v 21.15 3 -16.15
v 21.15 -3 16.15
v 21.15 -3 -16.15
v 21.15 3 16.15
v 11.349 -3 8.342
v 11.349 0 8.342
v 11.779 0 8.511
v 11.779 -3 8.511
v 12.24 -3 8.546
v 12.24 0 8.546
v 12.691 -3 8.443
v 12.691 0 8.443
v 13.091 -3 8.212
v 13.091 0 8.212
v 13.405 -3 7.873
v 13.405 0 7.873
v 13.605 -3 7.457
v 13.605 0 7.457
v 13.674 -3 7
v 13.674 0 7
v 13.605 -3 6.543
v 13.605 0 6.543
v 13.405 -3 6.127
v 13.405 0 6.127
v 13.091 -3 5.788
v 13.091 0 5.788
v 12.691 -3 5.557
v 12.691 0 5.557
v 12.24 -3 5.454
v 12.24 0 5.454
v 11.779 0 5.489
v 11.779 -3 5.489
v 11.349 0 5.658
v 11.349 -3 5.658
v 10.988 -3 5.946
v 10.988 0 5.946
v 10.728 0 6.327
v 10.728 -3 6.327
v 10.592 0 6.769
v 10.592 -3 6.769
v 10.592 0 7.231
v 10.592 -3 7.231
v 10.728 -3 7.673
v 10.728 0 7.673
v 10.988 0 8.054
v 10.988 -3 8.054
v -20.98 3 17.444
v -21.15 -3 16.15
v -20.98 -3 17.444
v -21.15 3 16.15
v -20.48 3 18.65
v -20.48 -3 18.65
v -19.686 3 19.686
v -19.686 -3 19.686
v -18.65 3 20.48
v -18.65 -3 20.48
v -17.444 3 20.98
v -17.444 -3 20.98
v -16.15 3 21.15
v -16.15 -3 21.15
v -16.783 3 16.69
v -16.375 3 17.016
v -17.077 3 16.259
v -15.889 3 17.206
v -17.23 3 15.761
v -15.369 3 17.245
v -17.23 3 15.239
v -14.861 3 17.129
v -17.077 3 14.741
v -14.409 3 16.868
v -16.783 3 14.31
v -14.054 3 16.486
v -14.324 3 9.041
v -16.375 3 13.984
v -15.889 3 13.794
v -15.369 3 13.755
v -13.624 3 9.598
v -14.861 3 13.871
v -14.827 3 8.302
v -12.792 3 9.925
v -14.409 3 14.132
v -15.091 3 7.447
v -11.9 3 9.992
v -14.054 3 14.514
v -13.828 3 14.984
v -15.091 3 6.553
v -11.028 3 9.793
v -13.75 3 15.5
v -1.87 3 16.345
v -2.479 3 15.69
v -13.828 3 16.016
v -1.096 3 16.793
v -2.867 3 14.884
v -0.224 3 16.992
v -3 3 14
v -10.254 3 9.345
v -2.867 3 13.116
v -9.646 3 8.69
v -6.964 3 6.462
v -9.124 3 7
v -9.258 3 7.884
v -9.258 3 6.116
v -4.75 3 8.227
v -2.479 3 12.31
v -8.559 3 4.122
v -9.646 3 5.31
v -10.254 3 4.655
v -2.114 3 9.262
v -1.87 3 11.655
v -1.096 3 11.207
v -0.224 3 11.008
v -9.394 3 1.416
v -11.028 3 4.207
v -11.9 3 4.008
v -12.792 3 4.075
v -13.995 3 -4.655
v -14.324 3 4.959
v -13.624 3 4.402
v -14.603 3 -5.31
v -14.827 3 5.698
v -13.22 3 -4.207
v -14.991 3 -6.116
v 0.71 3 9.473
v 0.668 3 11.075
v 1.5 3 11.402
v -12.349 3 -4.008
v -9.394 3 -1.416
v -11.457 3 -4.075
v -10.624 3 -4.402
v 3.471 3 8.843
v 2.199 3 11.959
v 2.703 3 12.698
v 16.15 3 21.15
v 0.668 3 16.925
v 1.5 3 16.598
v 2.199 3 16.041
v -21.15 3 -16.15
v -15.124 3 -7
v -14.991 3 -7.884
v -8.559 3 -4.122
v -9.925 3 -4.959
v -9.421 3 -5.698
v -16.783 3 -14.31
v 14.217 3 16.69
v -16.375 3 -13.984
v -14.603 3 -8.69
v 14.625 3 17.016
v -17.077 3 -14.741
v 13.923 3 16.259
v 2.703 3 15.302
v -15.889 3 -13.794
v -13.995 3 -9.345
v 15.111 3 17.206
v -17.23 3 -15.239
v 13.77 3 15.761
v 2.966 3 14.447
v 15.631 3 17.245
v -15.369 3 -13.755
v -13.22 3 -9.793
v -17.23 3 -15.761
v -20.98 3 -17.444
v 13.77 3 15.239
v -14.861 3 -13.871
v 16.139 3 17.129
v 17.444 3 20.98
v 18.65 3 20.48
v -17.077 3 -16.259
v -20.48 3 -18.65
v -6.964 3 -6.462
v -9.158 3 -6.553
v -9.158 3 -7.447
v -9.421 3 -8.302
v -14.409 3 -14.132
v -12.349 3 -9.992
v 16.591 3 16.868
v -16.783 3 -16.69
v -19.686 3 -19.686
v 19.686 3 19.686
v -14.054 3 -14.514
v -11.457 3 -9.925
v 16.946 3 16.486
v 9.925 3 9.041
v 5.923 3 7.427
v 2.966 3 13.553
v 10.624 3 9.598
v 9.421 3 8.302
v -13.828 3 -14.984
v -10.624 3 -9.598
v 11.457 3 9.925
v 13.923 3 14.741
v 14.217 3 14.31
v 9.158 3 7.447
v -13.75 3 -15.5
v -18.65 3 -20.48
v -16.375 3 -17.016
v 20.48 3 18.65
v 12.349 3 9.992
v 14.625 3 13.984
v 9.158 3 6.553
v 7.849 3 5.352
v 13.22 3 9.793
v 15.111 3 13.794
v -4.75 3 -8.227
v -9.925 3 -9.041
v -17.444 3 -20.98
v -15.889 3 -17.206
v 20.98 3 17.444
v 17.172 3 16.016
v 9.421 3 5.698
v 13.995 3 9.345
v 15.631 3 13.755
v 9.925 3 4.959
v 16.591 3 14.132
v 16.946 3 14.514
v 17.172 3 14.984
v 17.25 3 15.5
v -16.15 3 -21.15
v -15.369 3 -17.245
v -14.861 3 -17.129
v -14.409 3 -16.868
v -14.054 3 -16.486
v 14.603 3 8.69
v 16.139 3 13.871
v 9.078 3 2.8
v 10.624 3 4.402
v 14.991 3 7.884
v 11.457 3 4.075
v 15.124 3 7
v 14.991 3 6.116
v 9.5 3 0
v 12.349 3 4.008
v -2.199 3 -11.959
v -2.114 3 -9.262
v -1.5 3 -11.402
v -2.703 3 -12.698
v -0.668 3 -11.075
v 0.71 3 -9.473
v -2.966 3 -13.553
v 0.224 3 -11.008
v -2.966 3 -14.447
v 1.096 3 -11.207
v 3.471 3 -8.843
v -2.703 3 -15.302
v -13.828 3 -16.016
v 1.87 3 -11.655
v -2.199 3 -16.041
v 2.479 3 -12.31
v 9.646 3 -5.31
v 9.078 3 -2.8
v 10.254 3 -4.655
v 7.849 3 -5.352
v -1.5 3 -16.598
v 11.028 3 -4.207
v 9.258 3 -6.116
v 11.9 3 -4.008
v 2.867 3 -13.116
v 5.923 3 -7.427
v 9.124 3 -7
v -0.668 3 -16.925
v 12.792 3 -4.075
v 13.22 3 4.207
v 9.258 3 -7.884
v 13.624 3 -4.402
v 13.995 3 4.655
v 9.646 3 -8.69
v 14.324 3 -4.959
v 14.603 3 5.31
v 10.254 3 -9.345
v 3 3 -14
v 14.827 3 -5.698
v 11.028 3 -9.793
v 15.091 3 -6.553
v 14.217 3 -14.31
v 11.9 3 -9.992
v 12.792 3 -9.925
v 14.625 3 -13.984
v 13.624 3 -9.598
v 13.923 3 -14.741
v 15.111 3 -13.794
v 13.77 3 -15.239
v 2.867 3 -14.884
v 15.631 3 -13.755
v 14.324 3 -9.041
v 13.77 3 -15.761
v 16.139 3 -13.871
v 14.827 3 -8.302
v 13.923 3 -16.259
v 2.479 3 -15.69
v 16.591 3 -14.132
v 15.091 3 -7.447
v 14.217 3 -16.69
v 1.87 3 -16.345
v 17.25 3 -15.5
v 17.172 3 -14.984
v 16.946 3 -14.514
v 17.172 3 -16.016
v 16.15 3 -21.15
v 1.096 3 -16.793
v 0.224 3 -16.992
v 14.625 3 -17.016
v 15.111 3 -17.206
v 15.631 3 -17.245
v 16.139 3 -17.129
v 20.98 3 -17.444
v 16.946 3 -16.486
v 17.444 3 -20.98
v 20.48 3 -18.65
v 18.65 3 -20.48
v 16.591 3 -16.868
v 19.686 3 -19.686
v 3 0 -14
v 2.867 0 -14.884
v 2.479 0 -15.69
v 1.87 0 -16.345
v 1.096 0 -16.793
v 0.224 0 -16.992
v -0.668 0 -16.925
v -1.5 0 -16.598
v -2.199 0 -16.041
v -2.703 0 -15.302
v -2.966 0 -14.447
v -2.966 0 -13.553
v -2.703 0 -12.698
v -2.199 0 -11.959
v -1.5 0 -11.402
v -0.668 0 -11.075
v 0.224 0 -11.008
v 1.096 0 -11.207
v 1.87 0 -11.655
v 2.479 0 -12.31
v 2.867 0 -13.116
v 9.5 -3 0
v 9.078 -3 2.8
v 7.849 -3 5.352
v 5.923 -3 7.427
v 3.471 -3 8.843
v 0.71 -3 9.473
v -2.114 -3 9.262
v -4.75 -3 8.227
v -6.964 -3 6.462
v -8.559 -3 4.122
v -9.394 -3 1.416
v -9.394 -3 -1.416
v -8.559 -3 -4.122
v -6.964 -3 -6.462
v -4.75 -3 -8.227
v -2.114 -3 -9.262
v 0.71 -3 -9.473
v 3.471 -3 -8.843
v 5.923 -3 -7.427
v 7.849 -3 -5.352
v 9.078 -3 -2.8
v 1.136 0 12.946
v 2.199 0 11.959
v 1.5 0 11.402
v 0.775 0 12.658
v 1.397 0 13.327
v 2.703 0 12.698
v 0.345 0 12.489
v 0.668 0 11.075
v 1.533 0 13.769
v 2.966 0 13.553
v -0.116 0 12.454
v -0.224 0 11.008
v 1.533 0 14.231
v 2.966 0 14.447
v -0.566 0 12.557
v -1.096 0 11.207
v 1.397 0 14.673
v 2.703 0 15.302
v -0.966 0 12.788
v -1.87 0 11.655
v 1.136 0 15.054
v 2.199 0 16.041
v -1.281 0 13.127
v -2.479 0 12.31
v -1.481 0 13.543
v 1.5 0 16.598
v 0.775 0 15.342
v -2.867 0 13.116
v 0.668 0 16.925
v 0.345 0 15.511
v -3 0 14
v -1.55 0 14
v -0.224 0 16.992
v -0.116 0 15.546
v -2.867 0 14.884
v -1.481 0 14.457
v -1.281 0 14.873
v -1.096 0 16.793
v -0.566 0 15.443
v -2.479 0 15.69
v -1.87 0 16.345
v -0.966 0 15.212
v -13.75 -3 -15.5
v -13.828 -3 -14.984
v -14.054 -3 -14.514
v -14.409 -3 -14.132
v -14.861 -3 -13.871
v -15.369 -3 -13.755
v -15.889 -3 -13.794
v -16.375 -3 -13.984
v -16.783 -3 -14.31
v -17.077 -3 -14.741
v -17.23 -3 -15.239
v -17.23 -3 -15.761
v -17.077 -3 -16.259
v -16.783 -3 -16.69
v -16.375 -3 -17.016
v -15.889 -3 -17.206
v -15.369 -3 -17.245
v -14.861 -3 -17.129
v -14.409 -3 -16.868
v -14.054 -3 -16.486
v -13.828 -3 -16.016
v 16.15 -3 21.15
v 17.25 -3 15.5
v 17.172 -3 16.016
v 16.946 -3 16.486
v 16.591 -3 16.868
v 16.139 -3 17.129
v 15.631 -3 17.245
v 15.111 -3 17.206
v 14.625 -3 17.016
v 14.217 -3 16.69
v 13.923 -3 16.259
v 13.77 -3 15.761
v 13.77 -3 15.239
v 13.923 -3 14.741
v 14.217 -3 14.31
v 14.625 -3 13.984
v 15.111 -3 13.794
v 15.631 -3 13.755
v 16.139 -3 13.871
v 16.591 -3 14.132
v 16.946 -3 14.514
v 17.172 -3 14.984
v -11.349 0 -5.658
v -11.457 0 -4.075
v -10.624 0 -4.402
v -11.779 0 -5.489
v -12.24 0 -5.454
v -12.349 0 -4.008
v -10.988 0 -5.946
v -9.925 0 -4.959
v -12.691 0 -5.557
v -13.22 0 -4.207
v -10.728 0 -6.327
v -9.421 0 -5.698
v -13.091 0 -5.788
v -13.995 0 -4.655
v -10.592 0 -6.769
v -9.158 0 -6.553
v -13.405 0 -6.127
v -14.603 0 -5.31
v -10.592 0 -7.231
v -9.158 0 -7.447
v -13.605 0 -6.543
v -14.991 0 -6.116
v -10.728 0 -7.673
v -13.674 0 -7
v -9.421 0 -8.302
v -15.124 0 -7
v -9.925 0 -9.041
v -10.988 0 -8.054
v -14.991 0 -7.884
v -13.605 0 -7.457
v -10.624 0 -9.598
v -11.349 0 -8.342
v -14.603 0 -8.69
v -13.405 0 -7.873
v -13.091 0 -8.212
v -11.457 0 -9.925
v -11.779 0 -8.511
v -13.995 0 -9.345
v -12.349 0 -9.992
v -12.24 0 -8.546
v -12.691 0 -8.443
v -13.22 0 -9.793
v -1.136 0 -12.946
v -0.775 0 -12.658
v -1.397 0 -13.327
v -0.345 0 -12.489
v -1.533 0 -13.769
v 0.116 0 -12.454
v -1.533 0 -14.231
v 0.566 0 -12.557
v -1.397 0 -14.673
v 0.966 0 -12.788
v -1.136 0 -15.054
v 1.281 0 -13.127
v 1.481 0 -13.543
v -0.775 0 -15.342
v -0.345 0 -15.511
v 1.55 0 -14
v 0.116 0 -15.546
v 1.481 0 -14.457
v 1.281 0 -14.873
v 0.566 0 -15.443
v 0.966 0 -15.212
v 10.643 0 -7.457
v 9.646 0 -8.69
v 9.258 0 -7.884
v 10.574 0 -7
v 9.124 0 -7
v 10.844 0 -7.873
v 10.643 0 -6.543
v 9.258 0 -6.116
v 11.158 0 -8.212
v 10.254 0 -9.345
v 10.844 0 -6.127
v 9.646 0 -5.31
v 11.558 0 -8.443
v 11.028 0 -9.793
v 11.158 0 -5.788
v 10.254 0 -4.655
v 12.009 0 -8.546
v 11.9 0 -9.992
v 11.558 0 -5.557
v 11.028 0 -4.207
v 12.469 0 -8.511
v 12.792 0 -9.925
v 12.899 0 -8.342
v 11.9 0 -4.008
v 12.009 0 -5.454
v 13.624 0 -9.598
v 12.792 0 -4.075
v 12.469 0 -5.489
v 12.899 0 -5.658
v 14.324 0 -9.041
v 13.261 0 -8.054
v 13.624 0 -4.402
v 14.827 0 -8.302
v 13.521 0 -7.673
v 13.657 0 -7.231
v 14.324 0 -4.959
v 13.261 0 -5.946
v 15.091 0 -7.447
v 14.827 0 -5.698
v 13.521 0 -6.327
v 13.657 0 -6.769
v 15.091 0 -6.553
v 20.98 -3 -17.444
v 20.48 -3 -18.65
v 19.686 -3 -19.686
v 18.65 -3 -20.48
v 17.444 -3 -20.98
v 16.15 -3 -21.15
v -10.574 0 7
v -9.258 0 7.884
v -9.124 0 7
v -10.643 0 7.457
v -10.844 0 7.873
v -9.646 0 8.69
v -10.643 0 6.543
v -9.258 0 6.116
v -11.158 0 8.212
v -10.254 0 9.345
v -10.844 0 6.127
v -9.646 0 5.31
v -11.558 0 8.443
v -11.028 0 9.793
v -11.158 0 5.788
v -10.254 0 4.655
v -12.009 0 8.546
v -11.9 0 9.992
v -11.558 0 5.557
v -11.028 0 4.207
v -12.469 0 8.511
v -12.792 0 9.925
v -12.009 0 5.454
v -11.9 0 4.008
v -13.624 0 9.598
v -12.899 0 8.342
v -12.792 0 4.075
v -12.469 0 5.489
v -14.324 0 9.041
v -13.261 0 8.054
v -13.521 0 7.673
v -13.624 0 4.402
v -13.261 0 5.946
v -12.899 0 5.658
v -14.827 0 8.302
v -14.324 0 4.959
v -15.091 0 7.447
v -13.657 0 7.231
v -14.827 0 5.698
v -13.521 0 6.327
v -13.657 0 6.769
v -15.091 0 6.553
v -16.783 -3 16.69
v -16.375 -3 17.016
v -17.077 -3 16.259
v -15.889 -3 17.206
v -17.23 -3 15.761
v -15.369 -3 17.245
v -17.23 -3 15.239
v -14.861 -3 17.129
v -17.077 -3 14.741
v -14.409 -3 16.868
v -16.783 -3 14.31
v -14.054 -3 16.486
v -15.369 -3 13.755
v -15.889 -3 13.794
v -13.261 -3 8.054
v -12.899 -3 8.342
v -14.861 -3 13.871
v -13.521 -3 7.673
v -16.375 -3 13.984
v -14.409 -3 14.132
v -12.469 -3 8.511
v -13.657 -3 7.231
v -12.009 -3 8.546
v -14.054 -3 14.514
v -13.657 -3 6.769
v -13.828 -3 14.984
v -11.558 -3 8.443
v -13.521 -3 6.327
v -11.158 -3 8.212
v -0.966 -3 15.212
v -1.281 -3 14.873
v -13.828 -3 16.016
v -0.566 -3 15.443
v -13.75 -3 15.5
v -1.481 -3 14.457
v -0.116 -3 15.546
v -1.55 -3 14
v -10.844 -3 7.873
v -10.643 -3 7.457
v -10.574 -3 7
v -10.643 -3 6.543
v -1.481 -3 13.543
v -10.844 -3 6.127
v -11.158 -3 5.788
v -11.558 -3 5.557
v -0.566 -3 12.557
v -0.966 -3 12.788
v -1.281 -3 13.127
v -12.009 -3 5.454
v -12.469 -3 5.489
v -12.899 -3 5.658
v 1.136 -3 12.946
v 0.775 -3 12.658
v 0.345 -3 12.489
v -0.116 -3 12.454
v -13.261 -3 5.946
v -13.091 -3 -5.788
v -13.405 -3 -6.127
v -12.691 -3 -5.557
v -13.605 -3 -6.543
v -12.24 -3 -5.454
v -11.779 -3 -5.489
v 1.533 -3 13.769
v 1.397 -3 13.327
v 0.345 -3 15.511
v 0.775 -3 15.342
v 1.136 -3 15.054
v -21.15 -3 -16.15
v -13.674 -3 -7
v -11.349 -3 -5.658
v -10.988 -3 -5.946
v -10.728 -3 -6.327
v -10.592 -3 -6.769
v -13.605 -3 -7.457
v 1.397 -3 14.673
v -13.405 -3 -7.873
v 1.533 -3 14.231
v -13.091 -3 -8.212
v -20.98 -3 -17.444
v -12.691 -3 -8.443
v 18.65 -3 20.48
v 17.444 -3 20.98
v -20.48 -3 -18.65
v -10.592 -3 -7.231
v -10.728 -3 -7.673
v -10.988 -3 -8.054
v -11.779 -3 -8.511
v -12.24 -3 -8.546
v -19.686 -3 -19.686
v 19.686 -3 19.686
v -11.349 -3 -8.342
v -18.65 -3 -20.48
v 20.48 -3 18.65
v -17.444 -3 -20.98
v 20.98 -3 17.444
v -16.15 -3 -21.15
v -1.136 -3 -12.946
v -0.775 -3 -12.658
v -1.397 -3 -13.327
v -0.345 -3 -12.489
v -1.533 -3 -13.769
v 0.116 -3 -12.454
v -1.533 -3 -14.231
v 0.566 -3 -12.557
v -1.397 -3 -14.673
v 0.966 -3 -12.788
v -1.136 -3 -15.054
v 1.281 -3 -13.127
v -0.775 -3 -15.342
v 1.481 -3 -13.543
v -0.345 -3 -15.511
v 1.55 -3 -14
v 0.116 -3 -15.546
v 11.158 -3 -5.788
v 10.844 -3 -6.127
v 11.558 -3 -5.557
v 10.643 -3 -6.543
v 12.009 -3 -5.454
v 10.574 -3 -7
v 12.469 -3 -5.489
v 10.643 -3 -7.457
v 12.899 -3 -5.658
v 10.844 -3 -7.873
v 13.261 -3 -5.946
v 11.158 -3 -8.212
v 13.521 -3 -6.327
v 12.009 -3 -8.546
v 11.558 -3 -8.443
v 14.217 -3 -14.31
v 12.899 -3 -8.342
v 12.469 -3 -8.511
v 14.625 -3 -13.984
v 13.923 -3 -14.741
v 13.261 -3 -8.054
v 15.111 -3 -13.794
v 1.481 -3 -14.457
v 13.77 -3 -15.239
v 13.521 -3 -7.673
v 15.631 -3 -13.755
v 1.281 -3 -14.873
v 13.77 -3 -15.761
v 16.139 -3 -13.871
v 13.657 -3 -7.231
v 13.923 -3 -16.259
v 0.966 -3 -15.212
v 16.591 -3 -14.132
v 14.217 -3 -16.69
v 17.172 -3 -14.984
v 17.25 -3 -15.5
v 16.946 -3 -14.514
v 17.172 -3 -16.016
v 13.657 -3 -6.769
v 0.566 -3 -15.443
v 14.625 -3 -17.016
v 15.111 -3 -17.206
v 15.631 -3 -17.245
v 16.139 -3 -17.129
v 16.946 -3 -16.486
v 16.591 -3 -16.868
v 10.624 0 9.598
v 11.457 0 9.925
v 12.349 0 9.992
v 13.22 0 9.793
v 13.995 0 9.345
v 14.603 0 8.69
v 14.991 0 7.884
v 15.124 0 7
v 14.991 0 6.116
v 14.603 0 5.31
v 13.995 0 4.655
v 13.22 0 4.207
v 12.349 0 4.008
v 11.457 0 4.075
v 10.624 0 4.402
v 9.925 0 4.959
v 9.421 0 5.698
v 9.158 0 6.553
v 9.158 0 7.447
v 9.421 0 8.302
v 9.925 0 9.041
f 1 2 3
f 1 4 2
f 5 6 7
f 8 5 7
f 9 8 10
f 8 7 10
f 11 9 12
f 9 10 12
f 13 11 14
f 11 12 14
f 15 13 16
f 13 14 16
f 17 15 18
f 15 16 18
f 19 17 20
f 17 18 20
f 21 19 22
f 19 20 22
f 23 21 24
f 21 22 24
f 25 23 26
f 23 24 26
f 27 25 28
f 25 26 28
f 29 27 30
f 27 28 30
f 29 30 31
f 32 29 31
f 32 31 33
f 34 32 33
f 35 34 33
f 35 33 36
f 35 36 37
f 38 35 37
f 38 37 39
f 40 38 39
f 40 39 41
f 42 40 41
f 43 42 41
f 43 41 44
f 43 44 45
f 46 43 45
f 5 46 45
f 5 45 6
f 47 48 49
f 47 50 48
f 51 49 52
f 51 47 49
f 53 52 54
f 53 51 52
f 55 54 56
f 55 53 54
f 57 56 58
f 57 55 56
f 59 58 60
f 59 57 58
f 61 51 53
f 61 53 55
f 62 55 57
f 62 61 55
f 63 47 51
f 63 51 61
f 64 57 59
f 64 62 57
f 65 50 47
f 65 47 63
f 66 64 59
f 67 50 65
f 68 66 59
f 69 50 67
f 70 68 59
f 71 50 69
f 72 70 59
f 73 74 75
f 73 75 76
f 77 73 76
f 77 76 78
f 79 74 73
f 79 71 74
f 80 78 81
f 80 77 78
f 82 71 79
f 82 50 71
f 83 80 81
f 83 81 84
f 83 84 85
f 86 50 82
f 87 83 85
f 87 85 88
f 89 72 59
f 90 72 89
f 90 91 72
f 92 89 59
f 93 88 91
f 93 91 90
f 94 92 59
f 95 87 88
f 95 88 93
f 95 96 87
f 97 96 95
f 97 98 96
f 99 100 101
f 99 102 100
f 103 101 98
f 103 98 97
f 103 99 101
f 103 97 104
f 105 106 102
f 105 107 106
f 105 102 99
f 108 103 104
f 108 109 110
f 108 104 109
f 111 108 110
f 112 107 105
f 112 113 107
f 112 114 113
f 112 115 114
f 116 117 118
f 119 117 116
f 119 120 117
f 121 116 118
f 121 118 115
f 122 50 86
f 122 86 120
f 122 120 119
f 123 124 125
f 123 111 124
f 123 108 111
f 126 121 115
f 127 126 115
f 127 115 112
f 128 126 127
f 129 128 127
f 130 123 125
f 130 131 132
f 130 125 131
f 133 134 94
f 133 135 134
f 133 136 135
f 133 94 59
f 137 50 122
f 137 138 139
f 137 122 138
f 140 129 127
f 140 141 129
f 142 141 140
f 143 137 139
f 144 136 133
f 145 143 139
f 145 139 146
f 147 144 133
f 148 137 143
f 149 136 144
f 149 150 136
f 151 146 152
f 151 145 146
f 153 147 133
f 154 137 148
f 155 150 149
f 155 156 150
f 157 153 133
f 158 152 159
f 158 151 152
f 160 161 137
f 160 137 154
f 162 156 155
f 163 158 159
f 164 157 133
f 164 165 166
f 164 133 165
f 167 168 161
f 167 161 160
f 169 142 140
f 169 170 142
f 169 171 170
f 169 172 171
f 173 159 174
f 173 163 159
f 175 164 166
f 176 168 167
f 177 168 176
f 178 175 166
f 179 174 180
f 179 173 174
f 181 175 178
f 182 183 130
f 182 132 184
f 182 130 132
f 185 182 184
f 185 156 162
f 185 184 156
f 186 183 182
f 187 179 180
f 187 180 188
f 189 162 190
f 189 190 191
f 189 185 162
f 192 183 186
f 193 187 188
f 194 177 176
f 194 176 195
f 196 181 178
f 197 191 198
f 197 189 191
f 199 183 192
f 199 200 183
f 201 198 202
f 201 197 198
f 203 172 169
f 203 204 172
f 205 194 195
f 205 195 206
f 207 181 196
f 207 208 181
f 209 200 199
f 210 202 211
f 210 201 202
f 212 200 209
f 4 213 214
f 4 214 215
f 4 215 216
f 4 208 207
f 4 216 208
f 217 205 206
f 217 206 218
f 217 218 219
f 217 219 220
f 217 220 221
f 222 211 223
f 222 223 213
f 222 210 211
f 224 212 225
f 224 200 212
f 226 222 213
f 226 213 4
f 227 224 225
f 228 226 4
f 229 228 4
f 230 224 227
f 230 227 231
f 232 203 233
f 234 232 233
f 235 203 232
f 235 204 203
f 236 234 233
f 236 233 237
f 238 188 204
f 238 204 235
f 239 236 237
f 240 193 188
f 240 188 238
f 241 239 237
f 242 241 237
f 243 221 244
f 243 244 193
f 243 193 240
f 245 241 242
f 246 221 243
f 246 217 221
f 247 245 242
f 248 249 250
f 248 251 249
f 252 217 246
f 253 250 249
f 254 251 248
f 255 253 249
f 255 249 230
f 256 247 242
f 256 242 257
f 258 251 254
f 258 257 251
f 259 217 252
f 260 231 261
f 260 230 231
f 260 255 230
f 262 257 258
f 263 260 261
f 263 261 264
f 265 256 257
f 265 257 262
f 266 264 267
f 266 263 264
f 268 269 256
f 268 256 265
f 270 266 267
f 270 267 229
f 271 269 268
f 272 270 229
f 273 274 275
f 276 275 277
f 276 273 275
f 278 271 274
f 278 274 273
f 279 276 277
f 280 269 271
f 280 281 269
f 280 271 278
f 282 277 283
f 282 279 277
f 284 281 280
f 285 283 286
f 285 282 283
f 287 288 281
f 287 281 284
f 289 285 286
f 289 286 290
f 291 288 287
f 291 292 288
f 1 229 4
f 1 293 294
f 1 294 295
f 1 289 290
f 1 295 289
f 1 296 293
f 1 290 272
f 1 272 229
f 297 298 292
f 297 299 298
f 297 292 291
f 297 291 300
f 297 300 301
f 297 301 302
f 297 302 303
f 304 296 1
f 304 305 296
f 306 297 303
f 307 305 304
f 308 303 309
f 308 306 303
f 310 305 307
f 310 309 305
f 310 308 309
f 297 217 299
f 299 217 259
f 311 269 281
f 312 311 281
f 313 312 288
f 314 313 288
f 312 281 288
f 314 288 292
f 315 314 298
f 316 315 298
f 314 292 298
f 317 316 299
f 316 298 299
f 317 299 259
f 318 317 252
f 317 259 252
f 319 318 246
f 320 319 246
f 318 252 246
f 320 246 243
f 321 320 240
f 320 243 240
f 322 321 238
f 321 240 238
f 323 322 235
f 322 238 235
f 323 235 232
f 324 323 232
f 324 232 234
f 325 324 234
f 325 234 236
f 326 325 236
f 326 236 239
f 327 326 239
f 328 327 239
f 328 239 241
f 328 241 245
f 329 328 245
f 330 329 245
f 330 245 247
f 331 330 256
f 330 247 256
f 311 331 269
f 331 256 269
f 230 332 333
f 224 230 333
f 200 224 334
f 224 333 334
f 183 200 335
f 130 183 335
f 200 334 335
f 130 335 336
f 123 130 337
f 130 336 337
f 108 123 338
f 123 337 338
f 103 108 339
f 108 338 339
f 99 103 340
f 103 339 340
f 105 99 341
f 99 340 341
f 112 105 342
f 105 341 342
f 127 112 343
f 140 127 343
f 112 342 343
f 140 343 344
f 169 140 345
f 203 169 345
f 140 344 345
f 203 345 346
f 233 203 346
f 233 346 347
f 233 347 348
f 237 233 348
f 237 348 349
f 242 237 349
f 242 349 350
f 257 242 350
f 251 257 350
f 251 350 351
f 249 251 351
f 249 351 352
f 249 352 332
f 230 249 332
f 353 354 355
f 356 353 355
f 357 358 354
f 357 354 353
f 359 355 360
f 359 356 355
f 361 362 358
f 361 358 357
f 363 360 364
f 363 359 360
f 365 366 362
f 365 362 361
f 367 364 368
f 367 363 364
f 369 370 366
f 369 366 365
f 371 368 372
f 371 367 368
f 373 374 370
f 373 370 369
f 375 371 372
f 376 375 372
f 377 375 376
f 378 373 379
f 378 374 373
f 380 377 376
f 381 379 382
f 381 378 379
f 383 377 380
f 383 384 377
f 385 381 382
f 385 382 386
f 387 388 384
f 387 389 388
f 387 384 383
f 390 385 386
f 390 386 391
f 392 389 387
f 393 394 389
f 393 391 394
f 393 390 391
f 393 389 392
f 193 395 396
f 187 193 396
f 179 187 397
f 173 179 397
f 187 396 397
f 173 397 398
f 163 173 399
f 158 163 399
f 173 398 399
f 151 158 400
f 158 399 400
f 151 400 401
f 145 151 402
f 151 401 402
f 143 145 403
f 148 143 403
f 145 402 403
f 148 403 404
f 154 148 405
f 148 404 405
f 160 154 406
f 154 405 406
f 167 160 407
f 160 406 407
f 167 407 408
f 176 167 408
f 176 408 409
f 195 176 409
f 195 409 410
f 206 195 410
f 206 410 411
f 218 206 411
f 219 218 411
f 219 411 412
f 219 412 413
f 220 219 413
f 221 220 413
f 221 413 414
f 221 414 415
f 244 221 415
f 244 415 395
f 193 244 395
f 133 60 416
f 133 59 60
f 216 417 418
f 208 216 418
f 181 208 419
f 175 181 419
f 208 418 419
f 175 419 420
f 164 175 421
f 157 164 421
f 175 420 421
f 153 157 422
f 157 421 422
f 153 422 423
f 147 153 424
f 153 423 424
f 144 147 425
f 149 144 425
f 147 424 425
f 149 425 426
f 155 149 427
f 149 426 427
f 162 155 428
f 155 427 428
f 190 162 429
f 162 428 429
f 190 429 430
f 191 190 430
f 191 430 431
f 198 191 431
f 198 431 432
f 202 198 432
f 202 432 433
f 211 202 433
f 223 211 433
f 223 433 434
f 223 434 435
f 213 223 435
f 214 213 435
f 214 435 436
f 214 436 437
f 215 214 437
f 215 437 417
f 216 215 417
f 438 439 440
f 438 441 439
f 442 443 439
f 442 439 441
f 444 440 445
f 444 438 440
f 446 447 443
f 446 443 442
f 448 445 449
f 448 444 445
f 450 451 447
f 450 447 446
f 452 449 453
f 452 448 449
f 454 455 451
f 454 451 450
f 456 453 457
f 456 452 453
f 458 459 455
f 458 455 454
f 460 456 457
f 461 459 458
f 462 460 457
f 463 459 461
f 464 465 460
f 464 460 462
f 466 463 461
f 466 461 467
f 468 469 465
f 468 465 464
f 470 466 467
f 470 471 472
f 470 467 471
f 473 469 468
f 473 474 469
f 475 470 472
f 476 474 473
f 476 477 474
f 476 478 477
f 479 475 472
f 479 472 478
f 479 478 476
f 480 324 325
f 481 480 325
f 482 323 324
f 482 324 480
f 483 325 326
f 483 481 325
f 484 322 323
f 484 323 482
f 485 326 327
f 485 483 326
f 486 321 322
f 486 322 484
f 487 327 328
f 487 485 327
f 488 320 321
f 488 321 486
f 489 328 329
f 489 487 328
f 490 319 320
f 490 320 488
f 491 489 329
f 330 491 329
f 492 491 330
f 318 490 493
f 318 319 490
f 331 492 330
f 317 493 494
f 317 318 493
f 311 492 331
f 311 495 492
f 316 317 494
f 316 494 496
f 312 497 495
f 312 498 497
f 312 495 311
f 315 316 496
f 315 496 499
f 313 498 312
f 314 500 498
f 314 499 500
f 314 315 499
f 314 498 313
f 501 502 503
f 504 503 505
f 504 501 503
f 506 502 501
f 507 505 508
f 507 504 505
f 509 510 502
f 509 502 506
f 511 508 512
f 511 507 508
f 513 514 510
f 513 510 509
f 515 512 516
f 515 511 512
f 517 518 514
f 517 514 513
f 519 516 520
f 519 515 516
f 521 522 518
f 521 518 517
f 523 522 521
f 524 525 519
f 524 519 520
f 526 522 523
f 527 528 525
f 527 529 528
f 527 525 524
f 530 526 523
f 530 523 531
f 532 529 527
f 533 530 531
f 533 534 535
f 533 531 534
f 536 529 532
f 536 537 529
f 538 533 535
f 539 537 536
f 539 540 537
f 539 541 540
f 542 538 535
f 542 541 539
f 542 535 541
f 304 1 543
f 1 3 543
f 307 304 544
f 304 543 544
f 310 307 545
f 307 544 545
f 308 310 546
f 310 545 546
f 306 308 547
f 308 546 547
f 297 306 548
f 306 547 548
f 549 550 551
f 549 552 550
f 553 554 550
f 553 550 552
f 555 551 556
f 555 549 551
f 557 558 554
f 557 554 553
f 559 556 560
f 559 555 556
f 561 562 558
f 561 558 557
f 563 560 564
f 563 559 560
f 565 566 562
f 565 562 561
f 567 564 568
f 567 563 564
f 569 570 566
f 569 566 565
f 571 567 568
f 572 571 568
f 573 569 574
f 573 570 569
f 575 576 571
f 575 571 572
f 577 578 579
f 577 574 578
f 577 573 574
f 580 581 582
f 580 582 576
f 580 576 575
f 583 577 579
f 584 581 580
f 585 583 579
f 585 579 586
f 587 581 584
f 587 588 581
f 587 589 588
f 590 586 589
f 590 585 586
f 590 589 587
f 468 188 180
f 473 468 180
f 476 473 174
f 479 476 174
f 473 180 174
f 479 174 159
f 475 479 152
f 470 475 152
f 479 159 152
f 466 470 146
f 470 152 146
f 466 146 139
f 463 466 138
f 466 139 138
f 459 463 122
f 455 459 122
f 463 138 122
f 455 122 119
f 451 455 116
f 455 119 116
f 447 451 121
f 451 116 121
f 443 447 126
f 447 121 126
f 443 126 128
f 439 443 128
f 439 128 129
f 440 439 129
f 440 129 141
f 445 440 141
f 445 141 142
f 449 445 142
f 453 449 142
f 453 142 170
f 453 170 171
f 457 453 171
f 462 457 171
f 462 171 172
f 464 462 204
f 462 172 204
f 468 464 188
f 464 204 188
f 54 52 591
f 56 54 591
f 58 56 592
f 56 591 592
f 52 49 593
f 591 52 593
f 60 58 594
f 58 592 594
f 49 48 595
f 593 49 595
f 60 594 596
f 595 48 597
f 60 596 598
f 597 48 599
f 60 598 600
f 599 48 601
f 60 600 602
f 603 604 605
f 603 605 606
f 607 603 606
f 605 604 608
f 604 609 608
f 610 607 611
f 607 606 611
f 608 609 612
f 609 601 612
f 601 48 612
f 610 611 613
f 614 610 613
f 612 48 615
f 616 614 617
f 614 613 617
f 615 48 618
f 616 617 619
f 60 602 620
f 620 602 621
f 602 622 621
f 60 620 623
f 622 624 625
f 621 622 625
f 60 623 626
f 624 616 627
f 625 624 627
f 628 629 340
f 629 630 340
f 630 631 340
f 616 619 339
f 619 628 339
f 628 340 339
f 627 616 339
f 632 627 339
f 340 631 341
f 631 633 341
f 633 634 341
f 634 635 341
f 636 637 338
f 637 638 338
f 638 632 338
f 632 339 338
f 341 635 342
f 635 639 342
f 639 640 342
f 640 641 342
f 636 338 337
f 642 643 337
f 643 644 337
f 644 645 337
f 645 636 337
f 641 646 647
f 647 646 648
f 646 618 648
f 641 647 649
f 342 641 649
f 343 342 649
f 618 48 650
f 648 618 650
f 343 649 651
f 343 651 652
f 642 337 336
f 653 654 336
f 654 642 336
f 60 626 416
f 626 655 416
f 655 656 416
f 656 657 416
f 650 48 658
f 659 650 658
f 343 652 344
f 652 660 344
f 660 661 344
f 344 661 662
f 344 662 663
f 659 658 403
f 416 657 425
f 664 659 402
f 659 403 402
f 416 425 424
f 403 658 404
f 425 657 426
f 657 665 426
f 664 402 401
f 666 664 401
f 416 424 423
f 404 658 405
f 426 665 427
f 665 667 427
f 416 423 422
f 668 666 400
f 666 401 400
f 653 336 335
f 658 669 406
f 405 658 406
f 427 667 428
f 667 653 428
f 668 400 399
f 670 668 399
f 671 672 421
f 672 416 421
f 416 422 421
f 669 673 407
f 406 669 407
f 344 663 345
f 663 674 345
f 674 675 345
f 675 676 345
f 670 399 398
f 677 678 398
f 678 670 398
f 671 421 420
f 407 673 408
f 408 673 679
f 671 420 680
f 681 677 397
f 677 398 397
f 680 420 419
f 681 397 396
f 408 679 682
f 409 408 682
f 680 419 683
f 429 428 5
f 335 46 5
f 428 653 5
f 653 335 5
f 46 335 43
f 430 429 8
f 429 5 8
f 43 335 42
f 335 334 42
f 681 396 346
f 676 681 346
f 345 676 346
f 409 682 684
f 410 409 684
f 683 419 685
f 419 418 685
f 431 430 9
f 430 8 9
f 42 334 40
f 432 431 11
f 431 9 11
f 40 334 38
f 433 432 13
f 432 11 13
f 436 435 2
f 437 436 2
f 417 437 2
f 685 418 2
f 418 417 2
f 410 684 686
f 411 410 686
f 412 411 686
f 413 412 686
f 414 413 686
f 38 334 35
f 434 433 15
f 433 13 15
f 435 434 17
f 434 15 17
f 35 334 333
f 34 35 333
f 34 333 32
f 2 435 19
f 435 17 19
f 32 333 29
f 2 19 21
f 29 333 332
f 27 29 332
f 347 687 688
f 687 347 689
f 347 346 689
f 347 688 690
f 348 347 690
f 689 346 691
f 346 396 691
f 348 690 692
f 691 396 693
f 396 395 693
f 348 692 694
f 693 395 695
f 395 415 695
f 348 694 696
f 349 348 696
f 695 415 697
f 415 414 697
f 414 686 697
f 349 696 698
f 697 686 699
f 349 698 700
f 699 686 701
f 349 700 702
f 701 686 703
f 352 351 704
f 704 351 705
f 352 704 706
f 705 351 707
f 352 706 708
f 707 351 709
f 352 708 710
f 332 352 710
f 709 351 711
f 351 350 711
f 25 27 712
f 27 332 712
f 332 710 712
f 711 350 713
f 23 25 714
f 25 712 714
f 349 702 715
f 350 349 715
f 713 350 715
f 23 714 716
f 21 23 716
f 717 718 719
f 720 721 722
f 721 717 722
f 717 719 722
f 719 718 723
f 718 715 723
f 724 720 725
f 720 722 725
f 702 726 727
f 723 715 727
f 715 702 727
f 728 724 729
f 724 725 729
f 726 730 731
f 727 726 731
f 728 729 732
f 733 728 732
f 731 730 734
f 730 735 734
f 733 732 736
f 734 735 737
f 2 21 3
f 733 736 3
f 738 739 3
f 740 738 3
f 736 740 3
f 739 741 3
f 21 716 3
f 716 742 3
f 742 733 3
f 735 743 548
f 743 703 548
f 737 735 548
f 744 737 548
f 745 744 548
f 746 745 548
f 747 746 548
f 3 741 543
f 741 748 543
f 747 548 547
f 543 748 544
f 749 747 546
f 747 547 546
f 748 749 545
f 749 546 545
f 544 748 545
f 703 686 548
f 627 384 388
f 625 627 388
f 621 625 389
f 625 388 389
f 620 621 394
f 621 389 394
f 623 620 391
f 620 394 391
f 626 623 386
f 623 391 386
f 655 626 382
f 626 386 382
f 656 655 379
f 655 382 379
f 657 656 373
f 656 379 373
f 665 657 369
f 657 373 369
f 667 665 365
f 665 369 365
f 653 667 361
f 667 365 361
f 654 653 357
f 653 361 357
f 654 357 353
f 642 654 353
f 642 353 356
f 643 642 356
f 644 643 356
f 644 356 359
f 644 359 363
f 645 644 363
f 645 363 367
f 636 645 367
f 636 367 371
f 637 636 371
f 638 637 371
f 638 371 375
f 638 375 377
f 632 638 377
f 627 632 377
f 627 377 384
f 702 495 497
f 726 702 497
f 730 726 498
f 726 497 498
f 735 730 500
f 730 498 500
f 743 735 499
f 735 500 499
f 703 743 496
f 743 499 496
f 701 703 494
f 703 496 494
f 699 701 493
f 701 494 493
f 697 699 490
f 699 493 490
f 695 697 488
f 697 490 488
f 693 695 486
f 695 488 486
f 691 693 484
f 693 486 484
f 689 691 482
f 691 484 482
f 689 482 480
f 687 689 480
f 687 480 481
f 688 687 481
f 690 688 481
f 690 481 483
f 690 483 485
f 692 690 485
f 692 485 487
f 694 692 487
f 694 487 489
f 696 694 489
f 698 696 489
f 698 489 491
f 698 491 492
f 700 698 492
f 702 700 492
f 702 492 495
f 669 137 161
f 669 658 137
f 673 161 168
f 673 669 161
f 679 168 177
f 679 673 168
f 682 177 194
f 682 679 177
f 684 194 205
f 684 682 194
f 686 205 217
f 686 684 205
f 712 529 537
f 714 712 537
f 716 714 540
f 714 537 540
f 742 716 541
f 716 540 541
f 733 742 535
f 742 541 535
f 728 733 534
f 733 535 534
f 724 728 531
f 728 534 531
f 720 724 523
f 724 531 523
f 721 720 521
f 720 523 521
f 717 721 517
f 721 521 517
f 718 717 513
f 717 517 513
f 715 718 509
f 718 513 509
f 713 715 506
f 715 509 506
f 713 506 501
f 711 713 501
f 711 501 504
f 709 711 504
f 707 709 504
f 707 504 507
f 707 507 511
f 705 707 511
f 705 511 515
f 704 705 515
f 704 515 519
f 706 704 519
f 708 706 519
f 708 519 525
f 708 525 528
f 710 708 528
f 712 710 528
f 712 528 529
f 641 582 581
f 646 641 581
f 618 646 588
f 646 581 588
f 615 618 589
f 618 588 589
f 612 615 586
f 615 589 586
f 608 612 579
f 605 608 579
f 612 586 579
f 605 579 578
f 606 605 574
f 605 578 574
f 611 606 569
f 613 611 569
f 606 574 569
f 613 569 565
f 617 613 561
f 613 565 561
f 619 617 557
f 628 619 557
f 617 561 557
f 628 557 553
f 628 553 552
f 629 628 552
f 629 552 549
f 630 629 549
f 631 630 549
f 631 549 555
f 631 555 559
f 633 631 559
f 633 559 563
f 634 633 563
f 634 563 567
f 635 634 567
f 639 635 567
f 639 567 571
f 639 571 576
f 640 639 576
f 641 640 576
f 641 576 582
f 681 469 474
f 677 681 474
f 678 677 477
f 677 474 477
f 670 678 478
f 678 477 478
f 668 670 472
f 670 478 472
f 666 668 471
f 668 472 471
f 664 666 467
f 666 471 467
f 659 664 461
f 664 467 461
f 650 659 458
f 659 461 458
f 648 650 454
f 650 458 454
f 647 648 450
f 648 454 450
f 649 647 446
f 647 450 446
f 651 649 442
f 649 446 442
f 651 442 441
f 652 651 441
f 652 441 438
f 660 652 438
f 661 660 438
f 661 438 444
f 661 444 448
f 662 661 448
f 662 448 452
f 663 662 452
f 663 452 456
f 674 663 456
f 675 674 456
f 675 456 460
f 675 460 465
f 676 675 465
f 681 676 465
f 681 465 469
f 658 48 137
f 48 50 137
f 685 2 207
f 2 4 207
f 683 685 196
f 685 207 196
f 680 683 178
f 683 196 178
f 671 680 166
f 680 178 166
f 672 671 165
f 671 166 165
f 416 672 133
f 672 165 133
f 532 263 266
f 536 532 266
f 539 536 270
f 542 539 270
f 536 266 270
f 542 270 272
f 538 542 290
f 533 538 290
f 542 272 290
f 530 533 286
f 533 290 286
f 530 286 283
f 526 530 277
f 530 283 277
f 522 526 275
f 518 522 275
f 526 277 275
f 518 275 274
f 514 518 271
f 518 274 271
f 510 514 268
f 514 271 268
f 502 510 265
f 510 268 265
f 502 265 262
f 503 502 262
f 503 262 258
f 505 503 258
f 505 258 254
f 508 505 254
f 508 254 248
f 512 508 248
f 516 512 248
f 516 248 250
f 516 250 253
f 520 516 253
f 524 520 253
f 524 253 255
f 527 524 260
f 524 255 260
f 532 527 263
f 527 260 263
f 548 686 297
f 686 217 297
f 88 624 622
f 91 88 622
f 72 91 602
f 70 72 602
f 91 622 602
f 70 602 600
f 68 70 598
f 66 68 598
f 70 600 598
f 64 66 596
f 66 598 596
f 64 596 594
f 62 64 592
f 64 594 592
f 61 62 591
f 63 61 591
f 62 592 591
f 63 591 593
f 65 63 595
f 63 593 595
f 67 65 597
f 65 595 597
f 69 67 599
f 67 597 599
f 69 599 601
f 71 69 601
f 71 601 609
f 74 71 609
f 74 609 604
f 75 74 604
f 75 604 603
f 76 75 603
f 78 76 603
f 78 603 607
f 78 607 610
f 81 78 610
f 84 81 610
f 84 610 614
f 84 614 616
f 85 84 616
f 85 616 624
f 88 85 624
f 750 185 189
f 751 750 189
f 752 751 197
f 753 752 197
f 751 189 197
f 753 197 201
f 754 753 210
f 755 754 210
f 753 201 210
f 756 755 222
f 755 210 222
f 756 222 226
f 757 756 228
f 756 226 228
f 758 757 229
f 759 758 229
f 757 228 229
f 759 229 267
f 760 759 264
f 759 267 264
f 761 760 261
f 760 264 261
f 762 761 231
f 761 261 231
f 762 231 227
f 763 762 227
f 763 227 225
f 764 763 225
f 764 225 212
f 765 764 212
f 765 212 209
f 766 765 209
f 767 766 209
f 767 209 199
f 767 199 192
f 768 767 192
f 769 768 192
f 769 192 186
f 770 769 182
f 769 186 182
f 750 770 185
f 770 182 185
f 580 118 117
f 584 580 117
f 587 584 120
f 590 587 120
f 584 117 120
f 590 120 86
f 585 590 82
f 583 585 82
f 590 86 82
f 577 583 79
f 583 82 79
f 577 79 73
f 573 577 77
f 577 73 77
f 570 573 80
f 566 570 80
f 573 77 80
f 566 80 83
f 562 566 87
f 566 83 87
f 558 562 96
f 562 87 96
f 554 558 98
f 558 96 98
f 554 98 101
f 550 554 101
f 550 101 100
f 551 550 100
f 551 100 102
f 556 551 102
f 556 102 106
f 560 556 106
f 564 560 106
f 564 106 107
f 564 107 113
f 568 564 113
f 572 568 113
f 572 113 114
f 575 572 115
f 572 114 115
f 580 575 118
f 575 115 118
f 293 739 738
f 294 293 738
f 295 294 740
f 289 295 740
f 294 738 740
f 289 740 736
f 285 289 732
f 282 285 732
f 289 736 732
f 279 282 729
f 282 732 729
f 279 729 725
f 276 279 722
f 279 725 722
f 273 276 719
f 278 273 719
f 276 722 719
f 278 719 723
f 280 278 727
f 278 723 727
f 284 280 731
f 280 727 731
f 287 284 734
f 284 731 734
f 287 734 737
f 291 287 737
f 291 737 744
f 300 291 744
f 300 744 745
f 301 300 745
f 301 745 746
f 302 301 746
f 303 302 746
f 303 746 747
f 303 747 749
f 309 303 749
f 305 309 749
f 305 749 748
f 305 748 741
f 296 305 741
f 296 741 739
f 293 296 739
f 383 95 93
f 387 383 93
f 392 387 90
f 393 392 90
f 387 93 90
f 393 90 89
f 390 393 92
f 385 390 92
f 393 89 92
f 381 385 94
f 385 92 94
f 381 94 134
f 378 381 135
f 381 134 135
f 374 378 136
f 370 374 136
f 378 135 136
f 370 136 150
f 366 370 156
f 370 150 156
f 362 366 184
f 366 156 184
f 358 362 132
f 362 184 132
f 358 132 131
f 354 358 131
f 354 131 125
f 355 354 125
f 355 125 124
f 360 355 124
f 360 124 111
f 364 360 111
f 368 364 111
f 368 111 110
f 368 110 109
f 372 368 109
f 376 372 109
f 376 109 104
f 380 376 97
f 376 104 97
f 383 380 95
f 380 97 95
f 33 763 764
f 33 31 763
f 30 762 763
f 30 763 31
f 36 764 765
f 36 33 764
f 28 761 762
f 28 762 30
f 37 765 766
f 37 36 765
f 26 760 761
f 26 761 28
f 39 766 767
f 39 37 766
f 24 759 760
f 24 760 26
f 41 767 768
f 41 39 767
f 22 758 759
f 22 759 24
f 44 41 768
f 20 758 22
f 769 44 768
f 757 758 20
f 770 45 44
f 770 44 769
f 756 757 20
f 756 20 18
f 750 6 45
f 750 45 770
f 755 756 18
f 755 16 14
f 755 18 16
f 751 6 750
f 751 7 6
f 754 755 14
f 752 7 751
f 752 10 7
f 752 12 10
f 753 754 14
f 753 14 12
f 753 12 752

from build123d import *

# Parameters (mm, degrees)
SKETCH1_W           = 42.3
SKETCH1_H           = 42.3
BOSS_EXTRUDE1_DEPTH = 3
FILLET1_R           = 5
SKETCH2_R           = 1.75
CUT_EXTRUDE1_DEPTH  = 7
SKETCH4_R           = 9.5
CUT_EXTRUDE3_DEPTH  = 7
SKETCH5_R           = 1.55
CUT_EXTRUDE4_DEPTH  = 7
SKETCH6_R           = 3
CUT_EXTRUDE5_DEPTH  = 3
CIRPATTERN1_COUNT   = 6


with BuildPart() as part:
    # Sketch1 → Boss-Extrude1 (new body, symmetric)
    with BuildSketch(Plane(origin=(0, 0, 0), x_dir=(1, 0, 0), z_dir=(0, 1, 0))):
        Rectangle(SKETCH1_W, SKETCH1_H)
    extrude(amount=BOSS_EXTRUDE1_DEPTH, both=True)

    # Fillet1
    fillet1_edges = [part.edges().sort_by_distance(p)[0] for p in [
        (21.15, 0, 21.15),
        (-21.15, 0, 21.15),
        (-21.15, 0, -21.15),
        (21.15, 0, -21.15),
    ]]
    fillet(fillet1_edges, radius=FILLET1_R)

    # Sketch2 → Cut-Extrude1 (cut, through all)
    with BuildSketch(Plane.XZ.offset(3)):
        with Locations((-15.5, 15.5)):
            Circle(SKETCH2_R)
        with Locations((15.5, 15.5)):
            Circle(SKETCH2_R)
        with Locations((15.5, -15.5)):
            Circle(SKETCH2_R)
        with Locations((-15.5, -15.5)):
            Circle(SKETCH2_R)
    extrude(amount=-CUT_EXTRUDE1_DEPTH, mode=Mode.SUBTRACT)

    # Sketch4 → Cut-Extrude3 (cut, through all)
    with BuildSketch(Plane.XZ.offset(3)):
        Circle(SKETCH4_R)
    extrude(amount=-CUT_EXTRUDE3_DEPTH, mode=Mode.SUBTRACT)

    # Sketch5 → Cut-Extrude4 (cut, through all)
    with BuildSketch(Plane(origin=(0, 3, 0), x_dir=(1, 0, 0), z_dir=(0, 1, 0))):
        with Locations((0, 14)):
            Circle(SKETCH5_R)
    cut_extrude4 = extrude(amount=-CUT_EXTRUDE4_DEPTH, mode=Mode.SUBTRACT)

    # Sketch6 → Cut-Extrude5 (cut)
    with BuildSketch(Plane(origin=(0, 3, 0), x_dir=(1, 0, 0), z_dir=(0, 1, 0))):
        with Locations((0, 14)):
            Circle(SKETCH6_R)
    cut_extrude5 = extrude(amount=-CUT_EXTRUDE5_DEPTH, mode=Mode.SUBTRACT)

    # CirPattern1: Cut-Extrude4, Cut-Extrude5 ×6 about axis
    cirpattern1_axis = Axis((0, 0, 0), (0, 1, 0))
    for i in range(1, CIRPATTERN1_COUNT):
        add(cut_extrude4.rotate(cirpattern1_axis, i * 360 / CIRPATTERN1_COUNT), mode=Mode.SUBTRACT)
        add(cut_extrude5.rotate(cirpattern1_axis, i * 360 / CIRPATTERN1_COUNT), mode=Mode.SUBTRACT)


solid = part.part
